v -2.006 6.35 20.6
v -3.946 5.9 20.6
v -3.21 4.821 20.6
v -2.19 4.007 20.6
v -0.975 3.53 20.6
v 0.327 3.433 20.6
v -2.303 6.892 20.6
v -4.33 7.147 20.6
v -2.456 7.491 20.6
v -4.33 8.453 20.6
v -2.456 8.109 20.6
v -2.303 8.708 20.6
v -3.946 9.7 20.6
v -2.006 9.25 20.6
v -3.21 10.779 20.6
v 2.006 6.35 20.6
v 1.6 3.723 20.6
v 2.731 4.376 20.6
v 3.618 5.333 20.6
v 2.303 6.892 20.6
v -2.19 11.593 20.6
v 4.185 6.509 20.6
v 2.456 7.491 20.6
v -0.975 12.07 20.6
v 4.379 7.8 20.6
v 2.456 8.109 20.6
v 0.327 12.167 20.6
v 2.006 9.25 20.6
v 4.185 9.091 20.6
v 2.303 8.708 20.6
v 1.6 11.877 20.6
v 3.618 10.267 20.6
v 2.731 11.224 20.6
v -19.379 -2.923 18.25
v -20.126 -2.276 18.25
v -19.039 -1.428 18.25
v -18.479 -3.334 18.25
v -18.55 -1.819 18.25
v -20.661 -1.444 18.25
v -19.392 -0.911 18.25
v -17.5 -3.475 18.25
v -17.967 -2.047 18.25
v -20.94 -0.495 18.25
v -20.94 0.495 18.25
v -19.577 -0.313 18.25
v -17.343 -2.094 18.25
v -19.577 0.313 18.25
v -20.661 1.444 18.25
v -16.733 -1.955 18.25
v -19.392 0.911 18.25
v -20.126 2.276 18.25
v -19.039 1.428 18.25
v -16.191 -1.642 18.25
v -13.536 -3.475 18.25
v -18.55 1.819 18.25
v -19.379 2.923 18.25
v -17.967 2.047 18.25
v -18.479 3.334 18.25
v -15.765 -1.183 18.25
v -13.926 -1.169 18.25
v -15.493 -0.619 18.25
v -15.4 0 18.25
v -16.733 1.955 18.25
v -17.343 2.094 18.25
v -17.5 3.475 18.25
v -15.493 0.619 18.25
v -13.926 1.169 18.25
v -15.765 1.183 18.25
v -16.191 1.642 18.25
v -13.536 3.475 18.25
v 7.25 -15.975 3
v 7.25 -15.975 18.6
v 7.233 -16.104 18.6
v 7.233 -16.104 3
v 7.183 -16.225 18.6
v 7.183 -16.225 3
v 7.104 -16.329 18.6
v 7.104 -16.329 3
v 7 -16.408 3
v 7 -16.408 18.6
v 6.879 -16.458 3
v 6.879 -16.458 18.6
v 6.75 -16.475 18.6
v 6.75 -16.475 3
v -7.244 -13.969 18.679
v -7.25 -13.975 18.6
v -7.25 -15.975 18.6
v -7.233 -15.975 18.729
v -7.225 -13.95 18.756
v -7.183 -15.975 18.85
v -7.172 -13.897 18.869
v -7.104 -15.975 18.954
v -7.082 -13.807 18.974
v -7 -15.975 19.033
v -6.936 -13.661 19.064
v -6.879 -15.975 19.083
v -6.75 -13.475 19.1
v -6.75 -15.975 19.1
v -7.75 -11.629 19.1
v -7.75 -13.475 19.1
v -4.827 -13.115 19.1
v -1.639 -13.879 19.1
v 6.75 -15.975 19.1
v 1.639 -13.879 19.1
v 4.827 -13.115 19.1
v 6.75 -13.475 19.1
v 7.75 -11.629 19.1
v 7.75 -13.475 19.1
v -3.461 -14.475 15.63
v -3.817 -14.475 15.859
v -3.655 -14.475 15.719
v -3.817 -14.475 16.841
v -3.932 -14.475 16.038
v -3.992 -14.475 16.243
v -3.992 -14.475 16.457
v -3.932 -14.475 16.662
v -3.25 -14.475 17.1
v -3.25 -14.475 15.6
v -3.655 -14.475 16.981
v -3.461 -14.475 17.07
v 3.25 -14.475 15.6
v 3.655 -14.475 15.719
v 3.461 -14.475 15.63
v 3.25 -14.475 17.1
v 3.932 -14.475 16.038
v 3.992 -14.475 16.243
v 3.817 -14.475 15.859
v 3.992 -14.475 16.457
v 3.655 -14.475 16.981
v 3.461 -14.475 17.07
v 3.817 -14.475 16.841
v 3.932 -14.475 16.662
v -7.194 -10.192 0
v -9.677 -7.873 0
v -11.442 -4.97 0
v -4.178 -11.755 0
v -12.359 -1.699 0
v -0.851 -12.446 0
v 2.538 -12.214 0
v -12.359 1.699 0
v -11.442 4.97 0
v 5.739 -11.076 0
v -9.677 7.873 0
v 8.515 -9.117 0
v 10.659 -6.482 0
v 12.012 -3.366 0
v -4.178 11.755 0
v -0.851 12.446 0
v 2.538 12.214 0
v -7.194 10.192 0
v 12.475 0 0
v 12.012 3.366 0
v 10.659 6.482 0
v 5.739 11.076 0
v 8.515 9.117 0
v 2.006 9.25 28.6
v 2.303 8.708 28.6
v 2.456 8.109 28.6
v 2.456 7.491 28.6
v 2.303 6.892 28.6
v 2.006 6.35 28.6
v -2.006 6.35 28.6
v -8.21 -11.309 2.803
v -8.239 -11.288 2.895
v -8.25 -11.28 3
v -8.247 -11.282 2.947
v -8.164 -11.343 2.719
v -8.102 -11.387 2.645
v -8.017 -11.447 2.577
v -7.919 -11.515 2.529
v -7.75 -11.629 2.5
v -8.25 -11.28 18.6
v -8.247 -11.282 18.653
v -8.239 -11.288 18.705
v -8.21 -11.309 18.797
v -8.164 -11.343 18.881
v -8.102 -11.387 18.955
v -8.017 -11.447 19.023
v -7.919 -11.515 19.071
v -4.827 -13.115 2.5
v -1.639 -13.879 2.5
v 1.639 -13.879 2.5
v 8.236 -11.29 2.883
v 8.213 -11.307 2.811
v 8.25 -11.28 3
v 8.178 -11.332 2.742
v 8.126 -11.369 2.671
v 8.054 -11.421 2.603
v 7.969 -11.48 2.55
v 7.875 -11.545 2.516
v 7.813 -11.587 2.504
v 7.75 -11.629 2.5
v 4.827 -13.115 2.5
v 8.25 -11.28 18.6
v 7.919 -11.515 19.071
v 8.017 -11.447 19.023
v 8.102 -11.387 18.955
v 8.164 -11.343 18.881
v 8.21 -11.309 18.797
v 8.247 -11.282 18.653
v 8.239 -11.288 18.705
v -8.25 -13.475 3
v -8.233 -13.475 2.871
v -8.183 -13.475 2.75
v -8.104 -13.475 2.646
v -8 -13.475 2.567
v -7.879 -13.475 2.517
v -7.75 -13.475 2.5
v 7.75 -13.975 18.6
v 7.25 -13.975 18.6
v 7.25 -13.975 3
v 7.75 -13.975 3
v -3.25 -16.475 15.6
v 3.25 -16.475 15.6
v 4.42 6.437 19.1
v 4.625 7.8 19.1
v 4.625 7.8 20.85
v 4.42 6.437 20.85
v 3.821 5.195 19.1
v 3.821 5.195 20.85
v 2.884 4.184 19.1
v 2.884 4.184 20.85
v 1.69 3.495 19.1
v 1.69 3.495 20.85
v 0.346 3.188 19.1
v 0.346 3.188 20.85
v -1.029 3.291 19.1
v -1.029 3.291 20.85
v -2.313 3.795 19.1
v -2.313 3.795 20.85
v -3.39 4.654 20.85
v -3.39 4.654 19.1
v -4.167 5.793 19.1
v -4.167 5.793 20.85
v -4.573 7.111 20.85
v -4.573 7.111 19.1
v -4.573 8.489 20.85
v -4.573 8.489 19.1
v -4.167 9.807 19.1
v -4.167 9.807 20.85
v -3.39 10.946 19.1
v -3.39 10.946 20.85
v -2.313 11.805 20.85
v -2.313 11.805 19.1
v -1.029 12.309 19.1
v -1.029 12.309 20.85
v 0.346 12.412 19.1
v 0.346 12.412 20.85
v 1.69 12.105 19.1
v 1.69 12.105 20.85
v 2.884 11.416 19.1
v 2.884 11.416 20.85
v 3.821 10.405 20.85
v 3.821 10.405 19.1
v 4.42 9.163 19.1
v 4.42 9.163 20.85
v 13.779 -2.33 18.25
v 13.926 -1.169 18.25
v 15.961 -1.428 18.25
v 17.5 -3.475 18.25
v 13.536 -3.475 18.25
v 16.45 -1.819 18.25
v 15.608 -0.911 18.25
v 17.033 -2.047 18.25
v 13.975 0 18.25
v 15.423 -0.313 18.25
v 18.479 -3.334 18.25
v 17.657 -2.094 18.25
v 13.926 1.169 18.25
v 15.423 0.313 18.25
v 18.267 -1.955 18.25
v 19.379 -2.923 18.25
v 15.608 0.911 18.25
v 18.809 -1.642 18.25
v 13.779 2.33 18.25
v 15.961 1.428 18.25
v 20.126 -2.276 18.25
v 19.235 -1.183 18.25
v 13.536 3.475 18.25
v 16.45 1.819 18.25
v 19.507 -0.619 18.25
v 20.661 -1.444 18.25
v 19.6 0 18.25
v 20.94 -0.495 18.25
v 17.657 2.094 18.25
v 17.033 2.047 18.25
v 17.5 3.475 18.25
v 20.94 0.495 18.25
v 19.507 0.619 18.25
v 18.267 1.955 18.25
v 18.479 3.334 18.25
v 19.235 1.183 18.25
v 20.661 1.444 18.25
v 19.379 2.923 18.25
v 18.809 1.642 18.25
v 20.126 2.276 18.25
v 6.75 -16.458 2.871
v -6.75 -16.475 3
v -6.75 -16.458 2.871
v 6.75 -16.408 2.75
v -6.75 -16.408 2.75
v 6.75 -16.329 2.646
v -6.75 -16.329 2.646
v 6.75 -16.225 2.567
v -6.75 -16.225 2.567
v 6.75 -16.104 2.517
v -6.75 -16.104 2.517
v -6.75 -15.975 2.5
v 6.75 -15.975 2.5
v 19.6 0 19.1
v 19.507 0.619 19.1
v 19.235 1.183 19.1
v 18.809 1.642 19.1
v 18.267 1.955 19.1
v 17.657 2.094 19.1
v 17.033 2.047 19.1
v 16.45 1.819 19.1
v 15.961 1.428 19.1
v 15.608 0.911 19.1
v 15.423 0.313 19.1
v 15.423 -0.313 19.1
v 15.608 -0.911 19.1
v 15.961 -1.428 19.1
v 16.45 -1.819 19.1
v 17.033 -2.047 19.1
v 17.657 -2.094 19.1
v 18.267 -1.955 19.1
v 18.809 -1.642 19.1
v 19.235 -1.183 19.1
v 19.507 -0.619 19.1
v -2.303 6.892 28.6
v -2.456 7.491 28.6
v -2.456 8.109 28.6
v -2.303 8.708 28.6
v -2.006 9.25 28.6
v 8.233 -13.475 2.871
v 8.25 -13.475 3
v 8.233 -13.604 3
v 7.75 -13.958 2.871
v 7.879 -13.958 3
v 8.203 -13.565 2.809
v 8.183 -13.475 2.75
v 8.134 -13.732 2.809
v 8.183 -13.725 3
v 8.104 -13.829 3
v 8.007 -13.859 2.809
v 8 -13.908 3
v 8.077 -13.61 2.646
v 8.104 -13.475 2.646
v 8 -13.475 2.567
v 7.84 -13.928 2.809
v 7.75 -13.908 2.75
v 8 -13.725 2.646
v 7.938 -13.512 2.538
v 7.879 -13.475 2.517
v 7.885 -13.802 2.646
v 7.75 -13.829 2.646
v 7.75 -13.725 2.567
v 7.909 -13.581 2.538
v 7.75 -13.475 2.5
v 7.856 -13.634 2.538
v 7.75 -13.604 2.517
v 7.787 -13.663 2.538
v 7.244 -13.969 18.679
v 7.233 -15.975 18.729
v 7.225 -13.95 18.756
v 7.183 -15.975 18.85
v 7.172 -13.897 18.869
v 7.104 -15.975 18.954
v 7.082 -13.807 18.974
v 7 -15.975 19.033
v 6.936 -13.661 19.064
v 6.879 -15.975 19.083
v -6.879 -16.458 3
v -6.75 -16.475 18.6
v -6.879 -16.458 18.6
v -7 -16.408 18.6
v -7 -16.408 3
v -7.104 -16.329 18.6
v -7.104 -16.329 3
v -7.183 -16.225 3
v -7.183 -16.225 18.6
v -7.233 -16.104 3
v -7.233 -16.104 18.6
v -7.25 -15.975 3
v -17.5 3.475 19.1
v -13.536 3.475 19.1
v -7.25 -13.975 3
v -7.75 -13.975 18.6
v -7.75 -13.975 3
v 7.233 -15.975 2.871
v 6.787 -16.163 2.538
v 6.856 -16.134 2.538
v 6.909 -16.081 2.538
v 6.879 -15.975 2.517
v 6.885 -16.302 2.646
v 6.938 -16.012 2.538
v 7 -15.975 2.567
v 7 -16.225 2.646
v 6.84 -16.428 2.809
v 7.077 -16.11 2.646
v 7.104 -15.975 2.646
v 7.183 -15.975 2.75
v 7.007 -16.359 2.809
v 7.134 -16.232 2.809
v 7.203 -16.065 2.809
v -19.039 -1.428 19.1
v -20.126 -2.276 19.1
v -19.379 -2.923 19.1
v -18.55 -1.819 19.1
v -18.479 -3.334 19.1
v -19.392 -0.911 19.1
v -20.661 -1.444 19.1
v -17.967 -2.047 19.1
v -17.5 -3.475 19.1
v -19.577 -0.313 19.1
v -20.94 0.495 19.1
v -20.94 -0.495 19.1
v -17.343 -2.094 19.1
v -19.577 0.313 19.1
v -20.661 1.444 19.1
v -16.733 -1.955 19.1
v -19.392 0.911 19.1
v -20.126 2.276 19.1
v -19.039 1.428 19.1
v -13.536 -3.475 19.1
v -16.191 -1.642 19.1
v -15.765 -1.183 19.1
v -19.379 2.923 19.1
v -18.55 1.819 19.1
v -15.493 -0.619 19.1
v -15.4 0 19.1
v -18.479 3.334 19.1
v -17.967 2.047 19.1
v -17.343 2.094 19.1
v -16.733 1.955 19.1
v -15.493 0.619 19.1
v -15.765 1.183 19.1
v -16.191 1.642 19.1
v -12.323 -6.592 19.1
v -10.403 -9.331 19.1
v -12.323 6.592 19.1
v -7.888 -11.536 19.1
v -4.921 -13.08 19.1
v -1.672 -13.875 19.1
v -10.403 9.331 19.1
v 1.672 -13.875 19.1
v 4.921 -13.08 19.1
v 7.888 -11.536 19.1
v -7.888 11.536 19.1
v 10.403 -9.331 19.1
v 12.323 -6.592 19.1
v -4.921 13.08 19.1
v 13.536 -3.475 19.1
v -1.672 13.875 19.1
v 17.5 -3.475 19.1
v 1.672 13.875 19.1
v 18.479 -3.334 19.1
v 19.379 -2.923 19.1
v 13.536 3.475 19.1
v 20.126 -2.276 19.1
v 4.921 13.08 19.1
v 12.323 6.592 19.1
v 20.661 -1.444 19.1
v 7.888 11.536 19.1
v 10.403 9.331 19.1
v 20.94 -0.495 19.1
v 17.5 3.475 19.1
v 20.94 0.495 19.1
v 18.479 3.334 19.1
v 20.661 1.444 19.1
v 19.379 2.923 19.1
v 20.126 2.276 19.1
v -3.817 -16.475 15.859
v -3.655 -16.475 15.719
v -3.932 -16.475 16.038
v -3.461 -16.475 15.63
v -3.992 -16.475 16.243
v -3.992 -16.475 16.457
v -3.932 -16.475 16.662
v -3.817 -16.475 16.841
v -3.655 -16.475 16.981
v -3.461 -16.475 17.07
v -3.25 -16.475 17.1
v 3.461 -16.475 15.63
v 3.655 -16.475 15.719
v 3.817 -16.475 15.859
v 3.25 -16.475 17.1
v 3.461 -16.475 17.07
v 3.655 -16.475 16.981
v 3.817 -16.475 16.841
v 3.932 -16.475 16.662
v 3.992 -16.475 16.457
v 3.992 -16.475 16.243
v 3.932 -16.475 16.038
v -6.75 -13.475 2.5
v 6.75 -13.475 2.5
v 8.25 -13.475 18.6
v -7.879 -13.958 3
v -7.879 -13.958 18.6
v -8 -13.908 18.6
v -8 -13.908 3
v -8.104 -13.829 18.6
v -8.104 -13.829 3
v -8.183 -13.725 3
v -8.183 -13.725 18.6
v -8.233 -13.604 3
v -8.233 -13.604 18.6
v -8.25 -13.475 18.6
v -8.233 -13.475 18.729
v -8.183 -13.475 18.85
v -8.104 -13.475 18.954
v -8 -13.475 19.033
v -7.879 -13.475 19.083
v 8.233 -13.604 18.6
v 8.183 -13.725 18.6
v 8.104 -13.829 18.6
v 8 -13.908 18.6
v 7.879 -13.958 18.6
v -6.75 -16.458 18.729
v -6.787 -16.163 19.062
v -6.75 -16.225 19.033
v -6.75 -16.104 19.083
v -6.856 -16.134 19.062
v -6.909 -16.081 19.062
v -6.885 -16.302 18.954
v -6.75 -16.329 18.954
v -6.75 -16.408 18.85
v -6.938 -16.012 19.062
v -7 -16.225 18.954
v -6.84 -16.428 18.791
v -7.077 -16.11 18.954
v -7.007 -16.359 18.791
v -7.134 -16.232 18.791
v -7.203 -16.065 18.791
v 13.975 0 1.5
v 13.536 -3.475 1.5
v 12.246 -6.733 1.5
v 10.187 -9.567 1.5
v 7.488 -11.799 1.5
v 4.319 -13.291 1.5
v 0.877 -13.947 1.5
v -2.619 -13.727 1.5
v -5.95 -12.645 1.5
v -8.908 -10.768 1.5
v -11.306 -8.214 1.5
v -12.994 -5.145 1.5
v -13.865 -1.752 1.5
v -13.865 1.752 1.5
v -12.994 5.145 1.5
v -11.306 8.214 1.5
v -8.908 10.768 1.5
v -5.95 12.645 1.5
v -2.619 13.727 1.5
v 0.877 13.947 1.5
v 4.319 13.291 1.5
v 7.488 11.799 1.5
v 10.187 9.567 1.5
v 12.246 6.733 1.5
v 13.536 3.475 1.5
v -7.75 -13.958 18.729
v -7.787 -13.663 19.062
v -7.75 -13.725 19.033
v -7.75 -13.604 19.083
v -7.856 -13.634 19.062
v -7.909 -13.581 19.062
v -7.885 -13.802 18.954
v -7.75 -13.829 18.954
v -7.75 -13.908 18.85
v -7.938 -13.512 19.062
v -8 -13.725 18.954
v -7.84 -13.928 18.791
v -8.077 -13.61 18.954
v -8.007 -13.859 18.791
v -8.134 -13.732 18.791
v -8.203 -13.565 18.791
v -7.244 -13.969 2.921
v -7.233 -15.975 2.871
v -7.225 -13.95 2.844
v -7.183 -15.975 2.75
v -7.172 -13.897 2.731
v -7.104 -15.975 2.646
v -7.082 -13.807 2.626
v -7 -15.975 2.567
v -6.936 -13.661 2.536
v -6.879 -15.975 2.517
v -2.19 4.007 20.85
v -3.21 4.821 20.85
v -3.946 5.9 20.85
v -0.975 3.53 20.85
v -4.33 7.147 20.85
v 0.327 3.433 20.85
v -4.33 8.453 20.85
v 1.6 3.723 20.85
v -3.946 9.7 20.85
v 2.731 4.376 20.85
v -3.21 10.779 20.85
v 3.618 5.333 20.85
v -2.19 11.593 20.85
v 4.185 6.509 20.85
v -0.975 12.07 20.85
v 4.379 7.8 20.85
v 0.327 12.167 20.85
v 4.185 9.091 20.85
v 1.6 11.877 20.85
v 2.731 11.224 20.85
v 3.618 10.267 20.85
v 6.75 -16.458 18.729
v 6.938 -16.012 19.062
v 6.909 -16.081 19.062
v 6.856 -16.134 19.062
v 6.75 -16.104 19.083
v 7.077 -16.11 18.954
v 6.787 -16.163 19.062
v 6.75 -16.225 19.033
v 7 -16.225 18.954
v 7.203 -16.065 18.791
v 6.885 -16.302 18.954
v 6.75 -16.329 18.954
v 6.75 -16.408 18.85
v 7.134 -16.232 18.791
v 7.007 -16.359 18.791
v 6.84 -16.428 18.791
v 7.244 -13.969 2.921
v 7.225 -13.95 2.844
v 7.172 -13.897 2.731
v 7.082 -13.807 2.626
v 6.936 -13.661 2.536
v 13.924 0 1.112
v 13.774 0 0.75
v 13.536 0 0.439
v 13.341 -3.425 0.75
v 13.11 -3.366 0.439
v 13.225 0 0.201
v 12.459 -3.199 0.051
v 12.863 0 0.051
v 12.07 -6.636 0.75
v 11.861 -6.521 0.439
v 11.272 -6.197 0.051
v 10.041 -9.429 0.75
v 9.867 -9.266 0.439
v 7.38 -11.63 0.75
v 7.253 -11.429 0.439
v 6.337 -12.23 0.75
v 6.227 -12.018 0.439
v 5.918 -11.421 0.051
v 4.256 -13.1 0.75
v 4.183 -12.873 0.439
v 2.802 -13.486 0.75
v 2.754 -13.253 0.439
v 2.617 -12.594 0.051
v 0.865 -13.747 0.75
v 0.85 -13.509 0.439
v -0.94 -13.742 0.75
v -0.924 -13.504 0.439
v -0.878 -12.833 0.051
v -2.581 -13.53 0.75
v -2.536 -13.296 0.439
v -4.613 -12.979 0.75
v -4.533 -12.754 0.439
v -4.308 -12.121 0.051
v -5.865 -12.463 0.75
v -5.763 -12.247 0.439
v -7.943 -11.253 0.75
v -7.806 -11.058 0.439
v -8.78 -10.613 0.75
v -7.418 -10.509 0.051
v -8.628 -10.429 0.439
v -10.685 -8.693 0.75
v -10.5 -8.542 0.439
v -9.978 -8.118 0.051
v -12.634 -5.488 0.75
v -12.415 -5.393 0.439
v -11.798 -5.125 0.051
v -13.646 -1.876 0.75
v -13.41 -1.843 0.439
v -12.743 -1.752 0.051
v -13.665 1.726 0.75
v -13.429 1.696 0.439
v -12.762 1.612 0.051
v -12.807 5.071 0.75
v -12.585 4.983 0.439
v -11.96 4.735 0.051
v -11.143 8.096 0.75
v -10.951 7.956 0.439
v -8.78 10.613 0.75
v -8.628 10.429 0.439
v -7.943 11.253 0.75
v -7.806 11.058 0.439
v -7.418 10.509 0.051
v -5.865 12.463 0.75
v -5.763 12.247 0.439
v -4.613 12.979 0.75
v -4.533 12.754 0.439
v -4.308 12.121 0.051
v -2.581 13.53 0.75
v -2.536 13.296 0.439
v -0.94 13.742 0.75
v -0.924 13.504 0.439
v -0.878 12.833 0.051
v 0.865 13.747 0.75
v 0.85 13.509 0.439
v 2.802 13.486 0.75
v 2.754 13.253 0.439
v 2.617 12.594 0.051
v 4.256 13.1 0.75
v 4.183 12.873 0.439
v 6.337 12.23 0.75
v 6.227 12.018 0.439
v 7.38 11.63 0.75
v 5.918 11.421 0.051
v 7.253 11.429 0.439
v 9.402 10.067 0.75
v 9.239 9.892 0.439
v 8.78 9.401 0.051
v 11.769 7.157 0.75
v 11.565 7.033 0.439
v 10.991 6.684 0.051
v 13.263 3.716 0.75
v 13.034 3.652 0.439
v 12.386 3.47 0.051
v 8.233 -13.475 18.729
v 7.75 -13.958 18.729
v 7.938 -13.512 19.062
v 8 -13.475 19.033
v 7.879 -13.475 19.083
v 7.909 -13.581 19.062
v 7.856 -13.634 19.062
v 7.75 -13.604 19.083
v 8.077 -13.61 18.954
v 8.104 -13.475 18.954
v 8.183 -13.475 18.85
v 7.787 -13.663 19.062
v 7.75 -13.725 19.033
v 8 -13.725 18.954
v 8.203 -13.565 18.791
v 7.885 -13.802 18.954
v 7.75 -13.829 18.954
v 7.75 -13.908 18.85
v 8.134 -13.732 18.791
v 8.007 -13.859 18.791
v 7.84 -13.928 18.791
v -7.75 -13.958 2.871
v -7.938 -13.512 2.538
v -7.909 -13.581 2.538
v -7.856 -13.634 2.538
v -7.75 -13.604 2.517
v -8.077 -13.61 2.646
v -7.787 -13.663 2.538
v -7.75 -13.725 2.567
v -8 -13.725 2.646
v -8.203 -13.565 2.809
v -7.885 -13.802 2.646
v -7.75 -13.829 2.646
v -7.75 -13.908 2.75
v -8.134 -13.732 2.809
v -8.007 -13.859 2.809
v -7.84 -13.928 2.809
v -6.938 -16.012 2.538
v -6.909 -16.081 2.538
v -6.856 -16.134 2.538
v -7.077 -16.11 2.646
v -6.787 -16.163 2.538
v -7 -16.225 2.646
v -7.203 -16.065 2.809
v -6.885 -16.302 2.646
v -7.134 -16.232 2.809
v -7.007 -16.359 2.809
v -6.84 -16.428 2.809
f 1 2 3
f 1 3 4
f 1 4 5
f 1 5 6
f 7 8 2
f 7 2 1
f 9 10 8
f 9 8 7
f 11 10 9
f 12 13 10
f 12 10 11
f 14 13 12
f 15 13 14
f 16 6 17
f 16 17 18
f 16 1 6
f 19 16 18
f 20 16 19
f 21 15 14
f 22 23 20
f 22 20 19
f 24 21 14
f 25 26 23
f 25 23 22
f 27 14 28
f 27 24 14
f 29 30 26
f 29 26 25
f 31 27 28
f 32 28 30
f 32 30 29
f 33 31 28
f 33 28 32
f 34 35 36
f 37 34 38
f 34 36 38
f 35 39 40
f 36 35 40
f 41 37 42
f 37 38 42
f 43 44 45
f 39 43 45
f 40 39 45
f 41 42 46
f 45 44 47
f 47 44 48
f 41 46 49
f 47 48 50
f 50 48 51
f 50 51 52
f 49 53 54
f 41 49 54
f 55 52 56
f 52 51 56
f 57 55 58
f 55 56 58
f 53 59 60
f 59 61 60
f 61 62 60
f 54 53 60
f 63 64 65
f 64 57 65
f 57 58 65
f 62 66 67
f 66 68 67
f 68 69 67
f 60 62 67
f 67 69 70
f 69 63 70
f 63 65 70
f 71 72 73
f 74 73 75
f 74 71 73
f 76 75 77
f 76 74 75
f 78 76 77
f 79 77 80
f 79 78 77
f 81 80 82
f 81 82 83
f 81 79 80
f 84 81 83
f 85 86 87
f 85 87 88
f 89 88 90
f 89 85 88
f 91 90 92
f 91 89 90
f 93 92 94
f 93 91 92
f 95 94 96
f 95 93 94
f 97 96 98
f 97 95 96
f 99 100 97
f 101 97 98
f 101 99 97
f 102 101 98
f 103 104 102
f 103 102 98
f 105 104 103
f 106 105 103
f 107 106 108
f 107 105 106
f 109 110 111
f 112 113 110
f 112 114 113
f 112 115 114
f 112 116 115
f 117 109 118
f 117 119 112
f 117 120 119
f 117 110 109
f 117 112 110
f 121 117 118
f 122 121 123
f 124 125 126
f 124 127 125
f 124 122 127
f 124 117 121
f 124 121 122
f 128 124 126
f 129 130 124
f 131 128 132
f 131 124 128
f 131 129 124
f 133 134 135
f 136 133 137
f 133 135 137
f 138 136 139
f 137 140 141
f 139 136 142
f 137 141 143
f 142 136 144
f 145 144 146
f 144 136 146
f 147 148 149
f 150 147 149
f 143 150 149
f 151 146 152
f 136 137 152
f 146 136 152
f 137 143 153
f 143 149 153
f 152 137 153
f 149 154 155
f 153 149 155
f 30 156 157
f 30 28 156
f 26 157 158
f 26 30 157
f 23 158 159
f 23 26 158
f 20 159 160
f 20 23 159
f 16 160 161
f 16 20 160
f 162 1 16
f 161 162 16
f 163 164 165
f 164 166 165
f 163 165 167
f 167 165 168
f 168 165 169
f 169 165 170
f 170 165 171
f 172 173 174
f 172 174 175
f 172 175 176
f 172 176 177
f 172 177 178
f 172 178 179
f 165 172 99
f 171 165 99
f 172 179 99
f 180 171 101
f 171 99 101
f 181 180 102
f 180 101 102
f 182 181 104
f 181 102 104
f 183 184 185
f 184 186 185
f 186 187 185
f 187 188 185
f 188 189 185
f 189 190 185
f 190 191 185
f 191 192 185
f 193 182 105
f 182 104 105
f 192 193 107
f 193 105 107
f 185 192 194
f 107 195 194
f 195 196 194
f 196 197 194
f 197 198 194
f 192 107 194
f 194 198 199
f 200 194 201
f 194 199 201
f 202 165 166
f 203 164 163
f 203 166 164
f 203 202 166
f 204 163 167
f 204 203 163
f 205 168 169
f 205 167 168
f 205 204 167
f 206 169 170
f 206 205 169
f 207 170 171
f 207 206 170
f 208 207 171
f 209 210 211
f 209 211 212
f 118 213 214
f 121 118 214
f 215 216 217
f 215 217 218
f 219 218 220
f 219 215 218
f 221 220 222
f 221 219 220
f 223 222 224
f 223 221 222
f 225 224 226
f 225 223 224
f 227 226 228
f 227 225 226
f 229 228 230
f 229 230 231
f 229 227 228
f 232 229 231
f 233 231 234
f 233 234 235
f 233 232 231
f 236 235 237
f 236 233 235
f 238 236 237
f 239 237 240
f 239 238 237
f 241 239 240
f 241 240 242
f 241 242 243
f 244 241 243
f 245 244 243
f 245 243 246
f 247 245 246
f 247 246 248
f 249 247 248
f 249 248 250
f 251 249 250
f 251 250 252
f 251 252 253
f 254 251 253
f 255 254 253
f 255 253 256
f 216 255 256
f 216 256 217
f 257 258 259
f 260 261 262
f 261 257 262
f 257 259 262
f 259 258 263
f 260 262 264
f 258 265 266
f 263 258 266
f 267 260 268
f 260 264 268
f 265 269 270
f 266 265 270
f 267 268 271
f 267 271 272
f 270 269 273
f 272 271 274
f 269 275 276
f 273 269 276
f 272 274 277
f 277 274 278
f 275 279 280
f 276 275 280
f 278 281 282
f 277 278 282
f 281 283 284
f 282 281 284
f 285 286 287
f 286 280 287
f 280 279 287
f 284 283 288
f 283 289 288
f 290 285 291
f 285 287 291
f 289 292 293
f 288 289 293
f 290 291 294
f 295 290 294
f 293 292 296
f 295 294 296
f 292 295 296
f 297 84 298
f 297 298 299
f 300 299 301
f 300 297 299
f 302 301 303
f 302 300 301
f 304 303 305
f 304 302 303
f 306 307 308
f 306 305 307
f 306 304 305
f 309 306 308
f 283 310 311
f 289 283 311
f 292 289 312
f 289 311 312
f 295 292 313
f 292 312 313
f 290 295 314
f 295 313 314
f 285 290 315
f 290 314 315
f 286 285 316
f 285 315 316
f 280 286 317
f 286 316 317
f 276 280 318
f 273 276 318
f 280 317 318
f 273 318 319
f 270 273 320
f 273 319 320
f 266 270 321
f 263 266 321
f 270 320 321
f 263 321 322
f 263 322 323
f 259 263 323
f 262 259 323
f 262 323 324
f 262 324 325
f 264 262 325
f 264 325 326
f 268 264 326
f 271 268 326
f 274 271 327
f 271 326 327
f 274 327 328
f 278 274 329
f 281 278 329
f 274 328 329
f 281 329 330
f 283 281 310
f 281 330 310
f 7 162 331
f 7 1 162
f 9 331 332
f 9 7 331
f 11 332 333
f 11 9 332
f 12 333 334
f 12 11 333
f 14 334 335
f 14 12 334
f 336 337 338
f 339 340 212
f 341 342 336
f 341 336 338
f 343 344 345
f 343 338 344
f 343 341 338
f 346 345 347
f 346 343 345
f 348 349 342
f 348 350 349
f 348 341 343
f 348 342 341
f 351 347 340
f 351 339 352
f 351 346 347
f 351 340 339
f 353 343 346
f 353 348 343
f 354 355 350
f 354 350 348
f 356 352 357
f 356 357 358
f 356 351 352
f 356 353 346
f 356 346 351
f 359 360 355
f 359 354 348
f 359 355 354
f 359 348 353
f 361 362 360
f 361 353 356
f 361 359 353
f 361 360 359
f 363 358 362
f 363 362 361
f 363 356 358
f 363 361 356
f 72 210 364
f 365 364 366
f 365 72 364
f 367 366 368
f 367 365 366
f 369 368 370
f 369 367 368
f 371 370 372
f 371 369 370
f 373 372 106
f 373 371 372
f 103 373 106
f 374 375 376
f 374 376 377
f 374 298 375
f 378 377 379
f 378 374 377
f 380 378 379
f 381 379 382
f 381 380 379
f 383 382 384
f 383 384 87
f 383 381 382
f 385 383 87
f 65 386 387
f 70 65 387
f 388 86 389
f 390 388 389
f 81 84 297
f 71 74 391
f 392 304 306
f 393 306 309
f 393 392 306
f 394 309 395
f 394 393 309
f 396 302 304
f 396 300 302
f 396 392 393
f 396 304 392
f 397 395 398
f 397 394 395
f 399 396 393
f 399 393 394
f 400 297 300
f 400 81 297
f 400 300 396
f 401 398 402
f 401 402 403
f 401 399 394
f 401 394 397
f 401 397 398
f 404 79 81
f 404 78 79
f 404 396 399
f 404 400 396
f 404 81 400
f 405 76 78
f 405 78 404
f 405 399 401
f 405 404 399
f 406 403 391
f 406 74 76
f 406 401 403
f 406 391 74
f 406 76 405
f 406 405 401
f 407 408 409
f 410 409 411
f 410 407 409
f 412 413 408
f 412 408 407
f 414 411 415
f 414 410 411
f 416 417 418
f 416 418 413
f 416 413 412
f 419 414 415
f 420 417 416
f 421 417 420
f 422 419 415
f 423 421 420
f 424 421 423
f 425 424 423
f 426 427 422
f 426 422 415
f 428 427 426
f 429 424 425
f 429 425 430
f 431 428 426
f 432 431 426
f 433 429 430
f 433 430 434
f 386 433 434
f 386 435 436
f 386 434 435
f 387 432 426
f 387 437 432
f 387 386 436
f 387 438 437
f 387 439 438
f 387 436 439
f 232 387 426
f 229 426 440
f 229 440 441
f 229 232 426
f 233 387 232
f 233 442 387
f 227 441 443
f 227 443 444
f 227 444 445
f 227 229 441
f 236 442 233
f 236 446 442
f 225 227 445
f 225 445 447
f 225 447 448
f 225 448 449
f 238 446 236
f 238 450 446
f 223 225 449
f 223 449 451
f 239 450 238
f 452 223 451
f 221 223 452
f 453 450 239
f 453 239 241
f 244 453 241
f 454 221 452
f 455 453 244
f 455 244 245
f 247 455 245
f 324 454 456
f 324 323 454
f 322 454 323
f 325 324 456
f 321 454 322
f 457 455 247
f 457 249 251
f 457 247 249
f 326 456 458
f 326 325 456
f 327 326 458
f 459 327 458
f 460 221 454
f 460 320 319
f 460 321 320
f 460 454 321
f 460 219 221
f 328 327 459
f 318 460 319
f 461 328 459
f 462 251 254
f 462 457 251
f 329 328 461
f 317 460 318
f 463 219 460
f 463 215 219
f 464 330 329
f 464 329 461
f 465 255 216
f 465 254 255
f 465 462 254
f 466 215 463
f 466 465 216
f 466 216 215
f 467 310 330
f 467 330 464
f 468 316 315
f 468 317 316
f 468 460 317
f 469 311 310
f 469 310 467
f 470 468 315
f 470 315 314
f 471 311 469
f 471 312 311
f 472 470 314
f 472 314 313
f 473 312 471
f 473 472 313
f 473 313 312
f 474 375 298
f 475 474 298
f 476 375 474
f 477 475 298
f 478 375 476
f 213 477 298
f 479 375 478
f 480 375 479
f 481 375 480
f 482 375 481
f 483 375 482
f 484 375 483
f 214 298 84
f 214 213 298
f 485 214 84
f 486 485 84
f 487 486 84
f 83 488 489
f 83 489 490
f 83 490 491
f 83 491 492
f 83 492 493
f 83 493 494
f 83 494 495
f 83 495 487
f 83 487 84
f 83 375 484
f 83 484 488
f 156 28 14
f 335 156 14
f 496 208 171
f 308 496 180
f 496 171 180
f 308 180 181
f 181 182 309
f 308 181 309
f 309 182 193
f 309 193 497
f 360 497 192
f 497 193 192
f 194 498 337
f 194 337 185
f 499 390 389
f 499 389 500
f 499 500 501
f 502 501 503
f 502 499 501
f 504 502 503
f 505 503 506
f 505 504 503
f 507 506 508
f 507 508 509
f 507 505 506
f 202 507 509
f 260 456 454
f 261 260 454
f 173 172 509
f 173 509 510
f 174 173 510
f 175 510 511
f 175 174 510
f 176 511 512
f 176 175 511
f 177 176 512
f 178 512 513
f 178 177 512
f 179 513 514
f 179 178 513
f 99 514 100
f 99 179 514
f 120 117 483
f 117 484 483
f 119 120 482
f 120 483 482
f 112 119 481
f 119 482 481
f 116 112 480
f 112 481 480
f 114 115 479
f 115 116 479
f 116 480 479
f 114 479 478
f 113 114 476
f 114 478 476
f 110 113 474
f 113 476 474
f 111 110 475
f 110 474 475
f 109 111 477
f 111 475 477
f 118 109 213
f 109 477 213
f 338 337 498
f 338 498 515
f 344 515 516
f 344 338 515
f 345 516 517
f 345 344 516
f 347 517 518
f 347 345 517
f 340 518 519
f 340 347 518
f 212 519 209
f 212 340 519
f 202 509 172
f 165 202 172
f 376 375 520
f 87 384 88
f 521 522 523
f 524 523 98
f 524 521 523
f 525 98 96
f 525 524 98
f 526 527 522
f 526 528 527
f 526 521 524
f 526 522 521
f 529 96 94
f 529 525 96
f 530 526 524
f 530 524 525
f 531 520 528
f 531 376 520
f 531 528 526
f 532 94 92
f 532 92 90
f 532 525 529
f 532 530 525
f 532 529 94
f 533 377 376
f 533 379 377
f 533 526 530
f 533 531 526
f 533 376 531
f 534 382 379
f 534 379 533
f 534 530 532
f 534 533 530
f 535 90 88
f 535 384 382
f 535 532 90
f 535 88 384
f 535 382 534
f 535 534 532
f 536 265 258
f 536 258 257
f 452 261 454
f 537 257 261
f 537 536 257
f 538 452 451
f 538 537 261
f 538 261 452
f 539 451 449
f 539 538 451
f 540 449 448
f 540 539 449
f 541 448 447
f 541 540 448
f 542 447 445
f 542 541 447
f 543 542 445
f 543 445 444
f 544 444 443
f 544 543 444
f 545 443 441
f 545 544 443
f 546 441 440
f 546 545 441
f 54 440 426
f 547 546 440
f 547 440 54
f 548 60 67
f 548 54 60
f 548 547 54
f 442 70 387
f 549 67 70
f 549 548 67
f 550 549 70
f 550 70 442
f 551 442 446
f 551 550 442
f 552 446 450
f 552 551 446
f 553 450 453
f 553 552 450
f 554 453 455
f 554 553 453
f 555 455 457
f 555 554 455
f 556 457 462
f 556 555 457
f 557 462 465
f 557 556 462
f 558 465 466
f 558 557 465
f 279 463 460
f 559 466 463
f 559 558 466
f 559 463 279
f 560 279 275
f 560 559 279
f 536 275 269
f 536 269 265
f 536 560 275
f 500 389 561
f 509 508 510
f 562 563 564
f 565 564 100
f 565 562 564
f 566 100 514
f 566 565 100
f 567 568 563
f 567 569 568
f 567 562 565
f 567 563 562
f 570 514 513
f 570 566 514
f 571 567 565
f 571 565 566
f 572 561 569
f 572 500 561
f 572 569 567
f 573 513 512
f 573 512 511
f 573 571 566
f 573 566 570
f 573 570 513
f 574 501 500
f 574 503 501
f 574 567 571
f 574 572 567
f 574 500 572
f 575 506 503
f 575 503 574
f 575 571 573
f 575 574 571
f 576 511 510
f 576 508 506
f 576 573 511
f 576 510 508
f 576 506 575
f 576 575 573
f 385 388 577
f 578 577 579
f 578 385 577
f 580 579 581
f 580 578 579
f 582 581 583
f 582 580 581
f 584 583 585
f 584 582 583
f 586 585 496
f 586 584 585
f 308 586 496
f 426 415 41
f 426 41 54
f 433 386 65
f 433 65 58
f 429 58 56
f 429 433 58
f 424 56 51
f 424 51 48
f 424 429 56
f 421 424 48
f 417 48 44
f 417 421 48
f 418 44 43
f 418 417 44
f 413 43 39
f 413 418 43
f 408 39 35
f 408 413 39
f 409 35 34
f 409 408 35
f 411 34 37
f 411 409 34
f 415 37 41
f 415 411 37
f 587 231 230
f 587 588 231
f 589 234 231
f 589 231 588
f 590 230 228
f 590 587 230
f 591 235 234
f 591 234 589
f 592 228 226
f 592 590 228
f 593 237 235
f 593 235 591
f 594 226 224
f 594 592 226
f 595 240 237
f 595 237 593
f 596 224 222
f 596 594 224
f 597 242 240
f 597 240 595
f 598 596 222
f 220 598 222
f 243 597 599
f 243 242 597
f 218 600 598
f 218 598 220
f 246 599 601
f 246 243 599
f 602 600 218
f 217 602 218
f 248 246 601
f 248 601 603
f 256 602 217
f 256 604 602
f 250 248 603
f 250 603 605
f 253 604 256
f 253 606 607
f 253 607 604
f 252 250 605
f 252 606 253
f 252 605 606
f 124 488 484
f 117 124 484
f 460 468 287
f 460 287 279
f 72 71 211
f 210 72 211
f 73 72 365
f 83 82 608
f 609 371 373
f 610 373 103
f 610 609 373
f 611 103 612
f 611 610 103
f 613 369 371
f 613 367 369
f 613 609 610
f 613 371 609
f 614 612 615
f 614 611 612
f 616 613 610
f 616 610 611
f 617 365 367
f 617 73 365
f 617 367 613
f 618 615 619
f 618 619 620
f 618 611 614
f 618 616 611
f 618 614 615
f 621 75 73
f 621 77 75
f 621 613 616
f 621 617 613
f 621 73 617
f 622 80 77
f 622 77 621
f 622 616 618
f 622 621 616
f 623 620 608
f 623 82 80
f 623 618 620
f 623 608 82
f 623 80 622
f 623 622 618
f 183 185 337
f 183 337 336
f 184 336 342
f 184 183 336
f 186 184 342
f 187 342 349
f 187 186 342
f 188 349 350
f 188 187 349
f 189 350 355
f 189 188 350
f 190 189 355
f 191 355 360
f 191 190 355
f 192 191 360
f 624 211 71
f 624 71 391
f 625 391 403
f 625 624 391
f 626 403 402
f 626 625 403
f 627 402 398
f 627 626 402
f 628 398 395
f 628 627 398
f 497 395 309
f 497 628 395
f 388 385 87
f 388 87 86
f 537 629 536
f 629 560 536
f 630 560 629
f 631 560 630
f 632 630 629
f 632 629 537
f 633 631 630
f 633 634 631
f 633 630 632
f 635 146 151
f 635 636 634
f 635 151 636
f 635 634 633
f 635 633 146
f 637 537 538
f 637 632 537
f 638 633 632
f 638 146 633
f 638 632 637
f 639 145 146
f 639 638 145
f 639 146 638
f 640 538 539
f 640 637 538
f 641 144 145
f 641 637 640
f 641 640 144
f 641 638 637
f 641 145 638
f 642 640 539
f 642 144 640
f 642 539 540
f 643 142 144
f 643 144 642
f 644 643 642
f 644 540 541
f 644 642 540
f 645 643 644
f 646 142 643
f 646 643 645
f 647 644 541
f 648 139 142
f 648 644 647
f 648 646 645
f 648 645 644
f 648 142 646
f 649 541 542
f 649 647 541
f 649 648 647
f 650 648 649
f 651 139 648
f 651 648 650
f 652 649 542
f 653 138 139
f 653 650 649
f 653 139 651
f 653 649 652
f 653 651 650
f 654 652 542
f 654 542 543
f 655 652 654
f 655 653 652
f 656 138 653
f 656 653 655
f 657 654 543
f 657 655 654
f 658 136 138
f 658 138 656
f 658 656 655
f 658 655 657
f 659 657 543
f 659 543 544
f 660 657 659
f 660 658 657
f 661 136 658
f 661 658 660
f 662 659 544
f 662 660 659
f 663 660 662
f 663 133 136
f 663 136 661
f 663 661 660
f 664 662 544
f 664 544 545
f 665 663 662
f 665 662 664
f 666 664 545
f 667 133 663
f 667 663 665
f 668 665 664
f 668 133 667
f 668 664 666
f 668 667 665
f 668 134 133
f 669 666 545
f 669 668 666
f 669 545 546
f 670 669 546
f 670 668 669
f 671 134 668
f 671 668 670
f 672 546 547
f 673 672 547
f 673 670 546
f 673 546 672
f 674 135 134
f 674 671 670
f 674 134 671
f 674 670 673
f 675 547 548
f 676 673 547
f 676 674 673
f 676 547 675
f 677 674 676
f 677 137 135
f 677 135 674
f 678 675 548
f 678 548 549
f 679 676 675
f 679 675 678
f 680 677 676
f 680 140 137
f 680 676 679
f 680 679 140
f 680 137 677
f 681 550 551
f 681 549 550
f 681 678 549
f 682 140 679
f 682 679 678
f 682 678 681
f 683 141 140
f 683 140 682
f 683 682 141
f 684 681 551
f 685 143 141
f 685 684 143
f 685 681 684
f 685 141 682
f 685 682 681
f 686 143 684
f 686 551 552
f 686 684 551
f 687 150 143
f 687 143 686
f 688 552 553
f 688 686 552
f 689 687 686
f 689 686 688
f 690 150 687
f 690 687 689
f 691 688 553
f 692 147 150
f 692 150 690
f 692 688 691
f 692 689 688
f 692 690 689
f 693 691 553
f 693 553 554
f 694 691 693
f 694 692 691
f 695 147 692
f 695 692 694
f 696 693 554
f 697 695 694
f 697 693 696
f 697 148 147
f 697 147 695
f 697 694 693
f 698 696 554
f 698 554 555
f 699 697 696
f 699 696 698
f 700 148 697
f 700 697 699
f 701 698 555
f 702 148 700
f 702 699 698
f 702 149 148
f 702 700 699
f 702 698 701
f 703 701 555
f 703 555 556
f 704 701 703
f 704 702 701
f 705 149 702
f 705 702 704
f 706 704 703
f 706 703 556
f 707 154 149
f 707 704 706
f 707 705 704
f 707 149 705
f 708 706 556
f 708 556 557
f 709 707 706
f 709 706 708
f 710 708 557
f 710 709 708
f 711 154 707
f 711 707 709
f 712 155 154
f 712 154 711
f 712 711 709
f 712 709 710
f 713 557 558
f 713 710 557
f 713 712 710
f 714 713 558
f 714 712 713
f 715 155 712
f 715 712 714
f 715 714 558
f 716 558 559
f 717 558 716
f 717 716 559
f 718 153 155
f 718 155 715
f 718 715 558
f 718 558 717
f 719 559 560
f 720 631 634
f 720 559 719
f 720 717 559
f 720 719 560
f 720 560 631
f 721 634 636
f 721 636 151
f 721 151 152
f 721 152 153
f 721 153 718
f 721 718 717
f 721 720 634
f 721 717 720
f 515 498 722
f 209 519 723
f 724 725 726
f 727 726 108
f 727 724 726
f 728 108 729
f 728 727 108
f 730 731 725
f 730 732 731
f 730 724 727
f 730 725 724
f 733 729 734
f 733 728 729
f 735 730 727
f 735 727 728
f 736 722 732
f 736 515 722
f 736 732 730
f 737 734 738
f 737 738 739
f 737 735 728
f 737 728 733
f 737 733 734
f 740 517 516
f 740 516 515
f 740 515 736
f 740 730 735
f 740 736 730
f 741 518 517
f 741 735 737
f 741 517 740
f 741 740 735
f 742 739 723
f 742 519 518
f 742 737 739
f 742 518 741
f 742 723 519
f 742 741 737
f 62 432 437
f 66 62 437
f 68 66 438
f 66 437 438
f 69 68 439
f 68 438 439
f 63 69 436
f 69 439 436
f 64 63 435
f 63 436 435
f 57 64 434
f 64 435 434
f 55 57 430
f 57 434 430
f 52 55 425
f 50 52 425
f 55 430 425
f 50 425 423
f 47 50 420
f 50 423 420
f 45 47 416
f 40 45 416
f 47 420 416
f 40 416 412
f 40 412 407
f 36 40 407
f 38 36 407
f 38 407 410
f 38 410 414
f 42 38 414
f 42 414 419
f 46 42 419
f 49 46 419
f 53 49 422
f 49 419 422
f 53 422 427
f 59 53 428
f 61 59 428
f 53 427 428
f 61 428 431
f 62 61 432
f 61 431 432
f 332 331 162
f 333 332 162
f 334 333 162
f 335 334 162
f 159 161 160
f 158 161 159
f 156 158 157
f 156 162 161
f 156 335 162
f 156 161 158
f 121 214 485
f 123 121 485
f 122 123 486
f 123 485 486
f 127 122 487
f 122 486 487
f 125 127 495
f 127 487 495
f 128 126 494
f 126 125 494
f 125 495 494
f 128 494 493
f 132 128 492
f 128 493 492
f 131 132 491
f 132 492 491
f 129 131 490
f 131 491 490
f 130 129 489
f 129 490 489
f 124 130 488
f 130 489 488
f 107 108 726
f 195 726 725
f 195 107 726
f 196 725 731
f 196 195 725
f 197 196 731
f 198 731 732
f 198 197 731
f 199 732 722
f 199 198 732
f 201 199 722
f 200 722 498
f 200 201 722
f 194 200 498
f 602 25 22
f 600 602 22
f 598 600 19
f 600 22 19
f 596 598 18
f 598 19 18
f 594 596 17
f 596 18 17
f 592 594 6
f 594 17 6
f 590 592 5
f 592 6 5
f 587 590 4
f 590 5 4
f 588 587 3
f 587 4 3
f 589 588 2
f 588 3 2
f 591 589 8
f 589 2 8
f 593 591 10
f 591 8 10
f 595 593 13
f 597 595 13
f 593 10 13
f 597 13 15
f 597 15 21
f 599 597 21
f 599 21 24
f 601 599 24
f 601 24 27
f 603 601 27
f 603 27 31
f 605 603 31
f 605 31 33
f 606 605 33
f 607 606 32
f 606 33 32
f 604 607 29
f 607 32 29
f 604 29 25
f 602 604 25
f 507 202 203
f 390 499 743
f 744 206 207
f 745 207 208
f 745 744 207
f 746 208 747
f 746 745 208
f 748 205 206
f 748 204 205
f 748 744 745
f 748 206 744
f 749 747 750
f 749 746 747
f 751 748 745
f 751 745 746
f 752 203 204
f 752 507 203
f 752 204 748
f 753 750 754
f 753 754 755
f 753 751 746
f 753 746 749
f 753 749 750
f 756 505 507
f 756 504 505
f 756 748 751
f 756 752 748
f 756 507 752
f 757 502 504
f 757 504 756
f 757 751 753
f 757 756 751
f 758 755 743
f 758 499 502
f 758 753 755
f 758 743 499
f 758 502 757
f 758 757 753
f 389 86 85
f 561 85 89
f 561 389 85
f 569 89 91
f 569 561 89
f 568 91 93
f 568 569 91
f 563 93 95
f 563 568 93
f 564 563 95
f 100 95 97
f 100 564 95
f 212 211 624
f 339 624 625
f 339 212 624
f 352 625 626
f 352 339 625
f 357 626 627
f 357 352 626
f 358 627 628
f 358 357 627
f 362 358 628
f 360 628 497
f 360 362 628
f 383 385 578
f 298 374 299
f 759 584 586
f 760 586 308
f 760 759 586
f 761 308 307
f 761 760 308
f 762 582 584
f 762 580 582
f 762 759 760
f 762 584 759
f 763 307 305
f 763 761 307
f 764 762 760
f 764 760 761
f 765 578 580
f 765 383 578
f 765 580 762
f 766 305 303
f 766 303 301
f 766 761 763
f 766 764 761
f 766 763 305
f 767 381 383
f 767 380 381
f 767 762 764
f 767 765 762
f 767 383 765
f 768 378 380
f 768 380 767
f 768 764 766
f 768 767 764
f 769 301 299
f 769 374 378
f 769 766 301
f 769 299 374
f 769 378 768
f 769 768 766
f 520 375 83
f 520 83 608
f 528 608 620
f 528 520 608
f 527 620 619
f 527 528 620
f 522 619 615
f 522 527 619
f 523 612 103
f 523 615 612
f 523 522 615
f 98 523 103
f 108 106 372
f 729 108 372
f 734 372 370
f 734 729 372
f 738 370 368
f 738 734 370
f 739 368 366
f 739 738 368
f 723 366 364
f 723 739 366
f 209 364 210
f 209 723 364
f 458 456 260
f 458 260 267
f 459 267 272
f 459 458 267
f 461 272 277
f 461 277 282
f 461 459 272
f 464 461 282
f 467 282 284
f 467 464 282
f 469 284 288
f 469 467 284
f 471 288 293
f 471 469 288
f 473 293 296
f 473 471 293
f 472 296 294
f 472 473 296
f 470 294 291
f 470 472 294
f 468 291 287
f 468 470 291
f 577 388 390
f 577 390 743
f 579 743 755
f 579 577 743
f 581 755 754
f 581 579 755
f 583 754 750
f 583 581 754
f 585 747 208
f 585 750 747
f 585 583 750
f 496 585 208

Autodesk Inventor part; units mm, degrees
ref_plane "YZ Plane" through (0, 0, 0) normal (1, 0, 0) x (0, 1, 0)
ref_plane "XZ Plane" through (0, 0, 0) normal (0, 1, 0) x (-1, 0, 0)
ref_plane "XY Plane" through (0, 0, 0) normal (0, 0, 1) x (1, 0, 0)
sketch "Sketch1" plane through (0, 0, 0) normal (0, 0, 1) x (1, 0, 0)
  circle A0 centre (0, 0) radius 13.975
  dimension "d0" = 27.95
extrude "Extrusion1" add sketch "Sketch1" along normal blind 19.1
sketch "Sketch2" plane through (0, 0, 19.1) normal (0, 0, 1) x (1, 0, 0)
  circle A0 centre (0, 0) radius 13.975 projected
  line L0 (0, 13.975) -> (0, 3.175)
  circle A1 centre (0, 7.8) radius 4.625
  circle A2 centre (0, 7.8) radius 4.3794
  point P0 (-33.1765, 10.4926)
  dimension "d3" = 10.8
  dimension "d4" = 9.25
extrude "Extrusion2" add sketch "Sketch2" along normal blind 1.75 contours A1 L0 A2 | L0 A2 A1
sketch "Sketch3" plane through (0, 7.8, 19.1) normal (0, 0, 1) x (1, 0, 0)
  circle A0 centre (0, 0) radius 4.3794 projected
  point P0 (0, -7.8)
extrude "Extrusion3" add sketch "Sketch3" along normal blind 1.5
sketch "Sketch4" plane through (0, 0, 19.1) normal (0, 0, 1) x (1, 0, 0)
  circle A0 centre (0, 7.8) radius 4.3794 projected
  circle A1 centre (0, 0) radius 13.975 projected
  circle A2 centre (0, 7.8) radius 4.625 projected
  line L0 (0, 13.975) -> (0, -0.275)
  circle A3 centre (17.5, 0) radius 2.1
  arc A4 (17.5, -3.475) -> (17.5, 3.475) centre (17.5, 0) ccw
  line L1 (17.5, 3.475) -> (13.5361, 3.475)
  line L2 (17.5, -3.475) -> (13.5361, -3.475)
  circle A5 centre (0, 0) radius 13.975
  circle A6 centre (-17.5, 0) radius 2.1
  arc A7 (-17.5, 3.475) -> (-17.5, -3.475) centre (-17.5, 0) ccw
  line L3 (-17.5, 3.475) -> (-13.5361, 3.475)
  line L4 (-17.5, -3.475) -> (-13.5361, -3.475)
  dimension "d9" = 14.25
extrude "Extrusion4" add sketch "Sketch4" against normal blind 0.85 contours L1 A4 L2 A1 | A1 L4 A7 L3
sketch "Sketch5" plane through (0, 7.8, 20.6) normal (0, 0, 1) x (1, 0, 0)
  circle A0 centre (0, 0) radius 4.3794 projected
  line L0 (-2.0058, -1.45) -> (2.0058, -1.45)
  line L1 (2.0058, 1.45) -> (-2.0058, 1.45)
  arc A1 (-2.0058, 1.45) -> (-2.0058, -1.45) centre (0, 0) ccw
  arc A2 (2.0058, -1.45) -> (2.0058, 1.45) centre (0, 0) ccw
  point P0 (0, -7.8)
extrude "Extrusion5" add sketch "Sketch5" along normal blind 8 contours A1 L1 A2 L0
sketch "Sketch6" plane through (0, 0, 19.1) normal (0, 0, 1) x (1, 0, 0)
  circle A0 centre (17.5, 0) radius 2.1 projected
  circle A1 centre (-17.5, 0) radius 2.1 projected
  arc A2 (13.5361, 3.475) -> (-13.5361, 3.475) centre (0, 0) ccw projected
  line L0 (-13.5361, 3.475) -> (-17.5, 3.475) projected
  arc A3 (-17.5, 3.475) -> (-17.5, -3.475) centre (-17.5, 0) ccw projected
  line L1 (-17.5, -3.475) -> (-13.5361, -3.475) projected
  arc A4 (-13.5361, -3.475) -> (13.5361, -3.475) centre (0, 0) ccw projected
  line L2 (13.5361, -3.475) -> (17.5, -3.475) projected
  arc A5 (17.5, -3.475) -> (17.5, 3.475) centre (17.5, 0) ccw projected
  line L3 (17.5, 3.475) -> (13.5361, 3.475) projected
  circle A6 centre (0, 7.8) radius 4.625 projected
  line L4 (0, -13.975) -> (0, -16.475)
  line L5 (0, -16.475) -> (-7.25, -16.475)
  line L6 (-7.25, -16.475) -> (-7.25, -13.975)
  line L7 (0, -16.475) -> (7.25, -16.475)
  line L8 (7.25, -16.475) -> (7.25, -13.975)
  line L9 (7.25, -13.975) -> (8.25, -13.975)
  line L10 (8.25, -13.975) -> (8.25, -11.28)
  line L11 (-7.25, -13.975) -> (-8.25, -13.975)
  line L12 (-8.25, -13.975) -> (-8.25, -11.28)
  dimension "d20" = 2.5
  dimension "d21" = 7.25
  dimension "d22" = 7.25
  dimension "d23" = 1
  dimension "d24" = 1
extrude "Extrusion6" add sketch "Sketch6" against normal blind 16.6 separate body contours L10 L9 L8 L7 L4 A4 | A4 L4 L5 L6 L11 L12
fillet "Fillet1" radius 1.5 1 edges at (-13.975, 0, 0)
sketch "Sketch7" plane through (-7.25, -16.475, 19.1) normal (0, -1, 0) x (1, 0, 0)
  line L0 (0, 0) -> (14.5, 0) projected
  line L1 (7.25, 0) -> (7.25, -2)
  line L2 (7.25, -2) -> (4, -2)
  line L3 (3.25, -2.75) -> (3.25, -2.75)
  line L4 (4, -3.5) -> (10.5, -3.5)
  line L5 (11.25, -2.75) -> (11.25, -2.75)
  line L6 (10.5, -2) -> (7.25, -2)
  arc A0 (10.5, -3.5) -> (11.25, -2.75) centre (10.5, -2.75) ccw
  arc A1 (11.25, -2.75) -> (10.5, -2) centre (10.5, -2.75) ccw
  arc A2 (4, -2) -> (3.25, -2.75) centre (4, -2.75) ccw
  arc A3 (3.25, -2.75) -> (4, -3.5) centre (4, -2.75) ccw
  point P0 (7.25, -19.1)
  point P1 (3.25, -2)
  point P2 (3.25, -3.5)
  point P3 (11.25, -3.5)
  point P4 (11.25, -2)
  dimension "d28" = 2
  dimension "d29" = 4
  dimension "d30" = 1.5
  dimension "d31" = 8
  dimension "d32" = 0.75
extrude "Extrusion7" cut sketch "Sketch7" against normal blind 2 bodies 2
fillet "Fillet2" radius 0.5 4 edges at (8.25, -13.975, 10.8) (7.25, -16.475, 10.8) (-8.25, -13.975, 10.8) (-7.25, -16.475, 10.8)
fillet "Fillet3" radius 0.5 22 edges at (7.25, -14.975, 2.5) (0, -16.475, 2.5) (-7.1036, -16.3286, 2.5) (-7.25, -14.975, 2.5) (7.1036, -16.3286, 2.5) (8.25, -12.3775, 2.5) (7.5, -13.975, 2.5) (8.1036, -13.8286, 2.5) (-8.1036, -13.8286, 2.5) (-8.25, -12.3775, 2.5) (-7.5, -13.975, 2.5) (7.1036, -16.3286, 19.1) (0, -16.475, 19.1) (-7.1036, -16.3286, 19.1) (-7.25, -14.975, 19.1) (7.25, -14.975, 19.1) (7.5, -13.975, 19.1) (8.25, -12.3775, 19.1) (8.1036, -13.8286, 19.1) (-8.25, -12.3775, 19.1) (-7.5, -13.975, 19.1) (-8.1036, -13.8286, 19.1)
properties part number "Mini Stepper 5v"
